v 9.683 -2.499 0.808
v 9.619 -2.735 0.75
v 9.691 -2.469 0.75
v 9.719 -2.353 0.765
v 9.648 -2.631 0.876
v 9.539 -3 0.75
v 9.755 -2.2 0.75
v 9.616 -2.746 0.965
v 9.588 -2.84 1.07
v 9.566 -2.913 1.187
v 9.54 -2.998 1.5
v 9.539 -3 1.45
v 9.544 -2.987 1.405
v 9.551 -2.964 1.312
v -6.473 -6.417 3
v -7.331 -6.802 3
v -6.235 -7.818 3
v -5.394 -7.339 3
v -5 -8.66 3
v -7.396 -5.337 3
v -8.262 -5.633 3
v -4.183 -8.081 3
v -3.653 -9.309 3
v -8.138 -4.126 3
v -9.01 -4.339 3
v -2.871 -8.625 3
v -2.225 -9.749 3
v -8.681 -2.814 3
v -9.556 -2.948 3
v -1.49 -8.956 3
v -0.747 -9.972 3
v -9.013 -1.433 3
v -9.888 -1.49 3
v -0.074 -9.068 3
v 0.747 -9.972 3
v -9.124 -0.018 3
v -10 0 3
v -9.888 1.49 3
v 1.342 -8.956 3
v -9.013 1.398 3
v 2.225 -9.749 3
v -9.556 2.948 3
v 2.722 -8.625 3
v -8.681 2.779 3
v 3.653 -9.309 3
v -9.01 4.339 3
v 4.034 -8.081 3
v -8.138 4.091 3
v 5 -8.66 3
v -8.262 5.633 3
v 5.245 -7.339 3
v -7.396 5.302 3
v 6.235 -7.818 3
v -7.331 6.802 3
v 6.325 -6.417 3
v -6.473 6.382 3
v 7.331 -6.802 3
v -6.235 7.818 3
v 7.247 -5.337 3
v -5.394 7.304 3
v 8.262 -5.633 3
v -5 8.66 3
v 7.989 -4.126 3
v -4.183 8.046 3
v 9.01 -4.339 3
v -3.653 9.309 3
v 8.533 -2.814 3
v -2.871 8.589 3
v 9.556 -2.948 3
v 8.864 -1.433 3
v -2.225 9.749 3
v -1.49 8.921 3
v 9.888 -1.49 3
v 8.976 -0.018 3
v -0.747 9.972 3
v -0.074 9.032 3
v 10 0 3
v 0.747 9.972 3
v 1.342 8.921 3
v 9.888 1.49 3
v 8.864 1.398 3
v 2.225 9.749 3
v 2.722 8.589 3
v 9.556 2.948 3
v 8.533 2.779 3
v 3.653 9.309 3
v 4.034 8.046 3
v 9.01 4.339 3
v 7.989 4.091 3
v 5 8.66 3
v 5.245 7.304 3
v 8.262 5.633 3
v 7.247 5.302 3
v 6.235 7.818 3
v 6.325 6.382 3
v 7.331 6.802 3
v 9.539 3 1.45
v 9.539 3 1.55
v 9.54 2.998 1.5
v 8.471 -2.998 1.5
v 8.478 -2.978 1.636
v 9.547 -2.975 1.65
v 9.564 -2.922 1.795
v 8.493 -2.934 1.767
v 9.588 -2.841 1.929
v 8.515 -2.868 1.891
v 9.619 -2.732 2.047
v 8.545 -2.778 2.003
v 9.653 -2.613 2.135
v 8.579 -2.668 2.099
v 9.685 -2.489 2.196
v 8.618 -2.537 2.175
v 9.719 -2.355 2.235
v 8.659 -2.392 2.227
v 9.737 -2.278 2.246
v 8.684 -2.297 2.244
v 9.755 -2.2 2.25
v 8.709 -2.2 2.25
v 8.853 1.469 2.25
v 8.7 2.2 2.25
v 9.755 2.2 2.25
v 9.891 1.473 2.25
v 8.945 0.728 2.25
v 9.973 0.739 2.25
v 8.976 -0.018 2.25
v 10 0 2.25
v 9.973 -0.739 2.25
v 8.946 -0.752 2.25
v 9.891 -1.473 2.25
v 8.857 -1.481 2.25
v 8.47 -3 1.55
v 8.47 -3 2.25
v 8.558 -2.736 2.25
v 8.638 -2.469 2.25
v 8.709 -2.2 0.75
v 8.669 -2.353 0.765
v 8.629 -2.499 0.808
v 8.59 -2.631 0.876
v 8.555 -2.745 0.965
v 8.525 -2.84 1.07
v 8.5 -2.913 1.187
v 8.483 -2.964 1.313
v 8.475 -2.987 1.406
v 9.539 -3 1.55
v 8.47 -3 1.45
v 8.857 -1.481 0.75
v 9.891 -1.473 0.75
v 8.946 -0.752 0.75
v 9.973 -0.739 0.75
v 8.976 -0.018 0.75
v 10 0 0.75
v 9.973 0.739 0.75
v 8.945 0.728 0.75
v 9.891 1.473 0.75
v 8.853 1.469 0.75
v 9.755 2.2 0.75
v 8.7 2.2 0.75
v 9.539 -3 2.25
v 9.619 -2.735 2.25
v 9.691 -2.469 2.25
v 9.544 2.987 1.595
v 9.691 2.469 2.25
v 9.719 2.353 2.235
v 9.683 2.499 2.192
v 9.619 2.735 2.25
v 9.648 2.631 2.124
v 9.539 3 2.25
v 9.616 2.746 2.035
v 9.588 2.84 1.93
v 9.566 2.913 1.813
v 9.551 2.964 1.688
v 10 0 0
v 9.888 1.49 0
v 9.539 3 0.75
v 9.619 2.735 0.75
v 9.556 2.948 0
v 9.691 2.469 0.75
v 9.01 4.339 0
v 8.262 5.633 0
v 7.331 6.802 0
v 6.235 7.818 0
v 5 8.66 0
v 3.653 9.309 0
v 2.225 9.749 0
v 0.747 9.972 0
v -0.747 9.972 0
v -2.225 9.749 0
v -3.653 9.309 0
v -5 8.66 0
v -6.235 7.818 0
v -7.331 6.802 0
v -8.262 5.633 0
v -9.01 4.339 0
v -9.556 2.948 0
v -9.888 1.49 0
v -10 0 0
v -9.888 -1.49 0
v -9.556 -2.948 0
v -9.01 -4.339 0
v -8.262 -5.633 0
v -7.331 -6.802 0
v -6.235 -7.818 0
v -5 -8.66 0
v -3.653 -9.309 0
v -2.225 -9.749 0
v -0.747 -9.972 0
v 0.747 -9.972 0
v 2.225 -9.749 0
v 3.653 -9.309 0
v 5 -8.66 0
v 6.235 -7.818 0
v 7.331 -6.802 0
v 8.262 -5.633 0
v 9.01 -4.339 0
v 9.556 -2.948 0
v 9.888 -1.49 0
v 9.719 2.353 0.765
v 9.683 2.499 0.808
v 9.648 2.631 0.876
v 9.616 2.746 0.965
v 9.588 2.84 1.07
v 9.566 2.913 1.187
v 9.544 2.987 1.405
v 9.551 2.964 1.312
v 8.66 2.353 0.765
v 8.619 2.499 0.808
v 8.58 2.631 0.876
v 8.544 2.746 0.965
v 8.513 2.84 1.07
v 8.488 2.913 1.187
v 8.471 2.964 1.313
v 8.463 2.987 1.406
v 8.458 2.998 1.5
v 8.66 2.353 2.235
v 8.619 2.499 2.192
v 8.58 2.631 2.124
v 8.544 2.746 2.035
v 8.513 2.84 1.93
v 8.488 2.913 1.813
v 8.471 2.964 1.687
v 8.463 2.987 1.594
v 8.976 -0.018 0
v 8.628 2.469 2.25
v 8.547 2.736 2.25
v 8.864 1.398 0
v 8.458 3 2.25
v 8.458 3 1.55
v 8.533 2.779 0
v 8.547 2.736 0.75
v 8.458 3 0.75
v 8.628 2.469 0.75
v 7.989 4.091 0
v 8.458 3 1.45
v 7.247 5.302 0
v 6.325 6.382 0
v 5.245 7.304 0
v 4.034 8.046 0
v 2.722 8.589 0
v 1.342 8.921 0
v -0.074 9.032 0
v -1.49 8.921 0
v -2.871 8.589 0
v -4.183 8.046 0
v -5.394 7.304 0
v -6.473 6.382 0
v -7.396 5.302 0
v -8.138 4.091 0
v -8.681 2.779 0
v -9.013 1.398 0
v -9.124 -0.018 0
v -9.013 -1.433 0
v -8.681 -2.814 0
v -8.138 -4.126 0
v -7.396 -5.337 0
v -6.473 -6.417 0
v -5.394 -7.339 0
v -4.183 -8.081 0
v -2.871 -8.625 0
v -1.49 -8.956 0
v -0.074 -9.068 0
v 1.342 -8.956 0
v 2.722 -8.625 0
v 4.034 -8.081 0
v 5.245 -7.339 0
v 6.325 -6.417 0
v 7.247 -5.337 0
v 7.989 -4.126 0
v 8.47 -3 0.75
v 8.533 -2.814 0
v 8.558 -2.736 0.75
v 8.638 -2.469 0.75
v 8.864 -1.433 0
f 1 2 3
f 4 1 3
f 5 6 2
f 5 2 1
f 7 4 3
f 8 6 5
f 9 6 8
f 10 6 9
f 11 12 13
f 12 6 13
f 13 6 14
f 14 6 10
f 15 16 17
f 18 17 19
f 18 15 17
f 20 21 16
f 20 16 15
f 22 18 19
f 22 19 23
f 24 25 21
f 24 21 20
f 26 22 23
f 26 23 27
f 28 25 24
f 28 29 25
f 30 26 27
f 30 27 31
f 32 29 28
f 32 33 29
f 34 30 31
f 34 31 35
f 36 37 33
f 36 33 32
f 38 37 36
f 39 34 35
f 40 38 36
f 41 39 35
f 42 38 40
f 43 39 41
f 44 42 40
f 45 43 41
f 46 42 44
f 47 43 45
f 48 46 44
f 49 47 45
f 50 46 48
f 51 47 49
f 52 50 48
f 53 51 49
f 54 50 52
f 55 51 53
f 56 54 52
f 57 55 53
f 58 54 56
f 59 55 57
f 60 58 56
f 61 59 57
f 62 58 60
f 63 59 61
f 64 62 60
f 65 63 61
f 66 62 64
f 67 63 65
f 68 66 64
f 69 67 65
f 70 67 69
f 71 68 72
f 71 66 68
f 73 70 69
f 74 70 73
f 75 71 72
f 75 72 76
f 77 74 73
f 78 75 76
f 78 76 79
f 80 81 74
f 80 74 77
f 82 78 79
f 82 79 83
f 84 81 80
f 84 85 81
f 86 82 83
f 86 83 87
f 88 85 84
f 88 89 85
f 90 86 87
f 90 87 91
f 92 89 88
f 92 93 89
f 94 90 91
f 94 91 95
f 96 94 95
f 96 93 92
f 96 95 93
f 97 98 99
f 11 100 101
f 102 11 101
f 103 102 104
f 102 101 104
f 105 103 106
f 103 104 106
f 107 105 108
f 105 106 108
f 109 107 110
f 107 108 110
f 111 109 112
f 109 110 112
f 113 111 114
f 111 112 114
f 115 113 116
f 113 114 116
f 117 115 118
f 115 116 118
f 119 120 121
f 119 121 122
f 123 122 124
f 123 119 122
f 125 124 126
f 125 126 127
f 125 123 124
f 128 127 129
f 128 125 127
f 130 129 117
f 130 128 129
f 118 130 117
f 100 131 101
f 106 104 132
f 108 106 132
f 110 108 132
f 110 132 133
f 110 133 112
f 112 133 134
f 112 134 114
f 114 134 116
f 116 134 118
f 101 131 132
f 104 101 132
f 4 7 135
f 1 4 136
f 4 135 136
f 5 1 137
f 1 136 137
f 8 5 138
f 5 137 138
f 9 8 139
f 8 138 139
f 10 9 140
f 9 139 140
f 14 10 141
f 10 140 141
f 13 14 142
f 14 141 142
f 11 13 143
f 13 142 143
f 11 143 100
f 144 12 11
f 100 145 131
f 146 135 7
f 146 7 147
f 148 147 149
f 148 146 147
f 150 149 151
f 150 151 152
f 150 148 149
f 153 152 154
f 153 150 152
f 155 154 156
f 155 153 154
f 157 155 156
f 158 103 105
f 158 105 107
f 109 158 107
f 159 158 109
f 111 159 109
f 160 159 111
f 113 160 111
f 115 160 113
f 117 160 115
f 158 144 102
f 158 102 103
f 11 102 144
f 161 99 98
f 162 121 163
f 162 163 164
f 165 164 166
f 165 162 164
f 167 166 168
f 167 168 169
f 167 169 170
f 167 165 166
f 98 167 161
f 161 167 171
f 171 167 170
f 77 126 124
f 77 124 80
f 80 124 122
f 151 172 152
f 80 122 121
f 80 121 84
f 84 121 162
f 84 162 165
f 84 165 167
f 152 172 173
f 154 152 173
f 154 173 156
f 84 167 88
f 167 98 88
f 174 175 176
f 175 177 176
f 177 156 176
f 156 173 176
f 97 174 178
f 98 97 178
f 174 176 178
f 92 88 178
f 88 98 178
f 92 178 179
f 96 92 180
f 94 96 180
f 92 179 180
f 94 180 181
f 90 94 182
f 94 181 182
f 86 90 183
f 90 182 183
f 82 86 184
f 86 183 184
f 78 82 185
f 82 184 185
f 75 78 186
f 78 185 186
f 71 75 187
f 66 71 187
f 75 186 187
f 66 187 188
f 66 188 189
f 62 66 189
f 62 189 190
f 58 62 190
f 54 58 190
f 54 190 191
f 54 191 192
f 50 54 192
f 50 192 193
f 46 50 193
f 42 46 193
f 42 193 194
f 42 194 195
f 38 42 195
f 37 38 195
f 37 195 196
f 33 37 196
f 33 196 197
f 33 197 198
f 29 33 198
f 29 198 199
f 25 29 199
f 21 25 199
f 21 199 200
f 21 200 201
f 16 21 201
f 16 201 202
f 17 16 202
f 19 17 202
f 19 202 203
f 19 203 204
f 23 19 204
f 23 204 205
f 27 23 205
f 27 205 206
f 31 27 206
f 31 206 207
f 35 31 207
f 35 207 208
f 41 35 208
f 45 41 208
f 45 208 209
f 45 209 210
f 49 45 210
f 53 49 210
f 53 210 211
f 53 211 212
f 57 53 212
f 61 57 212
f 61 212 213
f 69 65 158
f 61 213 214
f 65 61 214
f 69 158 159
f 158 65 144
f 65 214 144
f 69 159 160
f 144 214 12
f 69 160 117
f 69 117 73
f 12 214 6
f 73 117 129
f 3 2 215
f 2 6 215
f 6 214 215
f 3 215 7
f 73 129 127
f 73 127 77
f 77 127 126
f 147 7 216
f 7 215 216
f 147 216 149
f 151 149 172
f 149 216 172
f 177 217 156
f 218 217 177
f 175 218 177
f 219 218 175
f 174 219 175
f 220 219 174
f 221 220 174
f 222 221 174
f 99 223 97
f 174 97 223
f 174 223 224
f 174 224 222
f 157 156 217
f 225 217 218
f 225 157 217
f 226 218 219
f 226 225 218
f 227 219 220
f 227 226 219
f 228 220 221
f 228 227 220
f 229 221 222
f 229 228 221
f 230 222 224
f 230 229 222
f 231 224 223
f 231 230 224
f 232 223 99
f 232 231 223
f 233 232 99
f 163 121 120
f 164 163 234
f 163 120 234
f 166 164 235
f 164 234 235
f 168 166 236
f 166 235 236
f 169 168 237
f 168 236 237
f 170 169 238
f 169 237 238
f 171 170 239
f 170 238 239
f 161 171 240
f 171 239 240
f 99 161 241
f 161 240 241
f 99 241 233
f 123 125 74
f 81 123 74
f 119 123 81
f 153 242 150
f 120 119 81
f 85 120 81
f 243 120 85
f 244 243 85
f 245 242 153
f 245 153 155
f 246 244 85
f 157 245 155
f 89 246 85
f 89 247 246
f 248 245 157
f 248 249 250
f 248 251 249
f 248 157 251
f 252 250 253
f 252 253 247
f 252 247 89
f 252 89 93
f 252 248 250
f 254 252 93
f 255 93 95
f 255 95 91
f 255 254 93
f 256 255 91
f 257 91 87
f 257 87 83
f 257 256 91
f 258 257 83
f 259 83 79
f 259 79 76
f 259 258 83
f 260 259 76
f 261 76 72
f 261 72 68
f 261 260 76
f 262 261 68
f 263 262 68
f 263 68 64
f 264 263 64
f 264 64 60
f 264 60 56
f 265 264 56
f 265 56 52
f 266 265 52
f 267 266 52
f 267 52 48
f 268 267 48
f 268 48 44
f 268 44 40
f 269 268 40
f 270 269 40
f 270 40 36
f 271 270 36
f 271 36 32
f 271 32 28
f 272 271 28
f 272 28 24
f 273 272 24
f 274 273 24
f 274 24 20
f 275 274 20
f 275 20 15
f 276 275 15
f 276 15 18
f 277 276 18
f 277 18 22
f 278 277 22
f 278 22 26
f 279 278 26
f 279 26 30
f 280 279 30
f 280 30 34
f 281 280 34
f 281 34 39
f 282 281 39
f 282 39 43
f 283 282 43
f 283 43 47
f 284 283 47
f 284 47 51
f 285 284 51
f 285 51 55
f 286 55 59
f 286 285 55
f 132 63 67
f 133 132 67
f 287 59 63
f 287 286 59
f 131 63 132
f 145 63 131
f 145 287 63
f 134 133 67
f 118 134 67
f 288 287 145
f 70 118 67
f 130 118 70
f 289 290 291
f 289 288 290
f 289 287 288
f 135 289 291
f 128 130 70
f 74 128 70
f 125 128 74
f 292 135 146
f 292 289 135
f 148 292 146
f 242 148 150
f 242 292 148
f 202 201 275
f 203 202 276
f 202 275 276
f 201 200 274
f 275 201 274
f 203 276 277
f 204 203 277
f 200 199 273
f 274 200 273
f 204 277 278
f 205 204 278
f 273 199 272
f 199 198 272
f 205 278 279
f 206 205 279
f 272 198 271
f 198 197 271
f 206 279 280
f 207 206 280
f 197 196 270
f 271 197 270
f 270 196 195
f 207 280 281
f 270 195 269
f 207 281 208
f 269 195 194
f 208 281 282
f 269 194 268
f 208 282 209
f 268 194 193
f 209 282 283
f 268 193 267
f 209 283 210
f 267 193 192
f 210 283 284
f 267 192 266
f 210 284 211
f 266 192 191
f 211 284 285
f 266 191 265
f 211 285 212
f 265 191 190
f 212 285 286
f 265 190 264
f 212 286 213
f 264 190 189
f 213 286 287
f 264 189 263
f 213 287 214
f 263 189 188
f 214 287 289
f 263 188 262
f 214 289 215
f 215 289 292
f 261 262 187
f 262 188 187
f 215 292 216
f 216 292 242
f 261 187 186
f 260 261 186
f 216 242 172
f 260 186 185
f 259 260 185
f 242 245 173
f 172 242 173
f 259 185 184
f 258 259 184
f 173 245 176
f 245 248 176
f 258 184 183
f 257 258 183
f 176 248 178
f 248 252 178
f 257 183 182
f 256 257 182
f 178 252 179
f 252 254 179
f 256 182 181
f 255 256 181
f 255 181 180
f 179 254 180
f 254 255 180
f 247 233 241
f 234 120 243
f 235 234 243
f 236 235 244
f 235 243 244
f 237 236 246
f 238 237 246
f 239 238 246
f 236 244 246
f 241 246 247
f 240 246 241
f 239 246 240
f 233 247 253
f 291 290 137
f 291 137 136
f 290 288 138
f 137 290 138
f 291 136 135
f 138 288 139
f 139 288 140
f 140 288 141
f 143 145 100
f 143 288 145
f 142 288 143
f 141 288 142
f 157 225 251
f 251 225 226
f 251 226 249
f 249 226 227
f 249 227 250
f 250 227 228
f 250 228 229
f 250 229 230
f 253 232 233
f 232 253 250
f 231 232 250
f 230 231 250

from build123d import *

# Parameters (mm, degrees)
F0_R         = 10
F0_R_2       = 9.05
F1_DEPTH     = 3
F3_DEPTH     = 25
F4_T4_DEPTH  = 5.0690329252
F4_S5_R      = 10
F4_T6_DEPTH  = 4
F4_S7_R      = 9.05
F4_T8_DEPTH  = 4
F4_T12_DEPTH = 5.0690329252
F4_S13_R     = 10
F4_T14_DEPTH = 4
F4_S15_R     = 9.05
F4_T16_DEPTH = 4
F4_T20_DEPTH = 5.0814545551
F4_S21_R     = 10
F4_T22_DEPTH = 4
F4_S23_R     = 9.05
F4_T24_DEPTH = 4
F4_T28_DEPTH = 5.0814545551
F4_S29_R     = 10
F4_T30_DEPTH = 4
F4_S31_R     = 9.05
F4_T32_DEPTH = 4


# Not quite as in the source:
# - a fillet or chamfer that OpenCascade refuses, or shapes differently, is made with other operations: its cross-section is extruded or revolved along the edge and cut away or added


with BuildPart() as f1:
    # F0 (on Top) → F1 (new body)
    with BuildSketch(Plane.XY):
        Circle(F0_R)
        with Locations((-0.0741272524, -0.0176765498)):
            Circle(F0_R_2, mode=Mode.SUBTRACT)
    extrude(amount=F1_DEPTH)

    # F2 (on Right) → F3 (cut)
    with BuildSketch(Plane.YZ):
        Polygon((3, 0.75), (3, 2.25), (-3, 2.25), (-3, 0.75), (0, 0.75), align=None)
    extrude(amount=F3_DEPTH, mode=Mode.SUBTRACT)

    # F4: fillet of radius 0.8 on 4 edges, made by hand


with BuildPart() as f4_tool2:
    # F4_s3 → F4_t4 (new body)
    with BuildSketch(Plane.YZ.offset(6.4703590889)):
        with BuildLine():
            ThreePointArc((-3, 1.45), (-2.7656854249, 2.0156854249), (-2.2, 2.25))
            Line((-2.2, 2.25), (-3, 2.25))
            Line((-3, 2.25), (-3, 1.45))
        make_face()
    extrude(amount=F4_T4_DEPTH)

    # F4_s5 → F4_t6 (intersect, symmetric)
    with BuildSketch(Plane.XY.offset(1.9)):
        Circle(F4_S5_R)
    extrude(amount=F4_T6_DEPTH, both=True, mode=Mode.INTERSECT)

    # F4_s7 → F4_t8 (cut, symmetric)
    with BuildSketch(Plane.XY.offset(1.9)):
        with Locations((-0.0741272524, -0.0176765498)):
            Circle(F4_S7_R)
    extrude(amount=F4_T8_DEPTH, both=True, mode=Mode.SUBTRACT)


with BuildPart() as f1_1:
    add(f1.part)

    # F4_t1: union F4_tool2
    add(f4_tool2.part)


with BuildPart() as f4_tool10:
    # F4_s11 → F4_t12 (new body)
    with BuildSketch(Plane.YZ.offset(6.4703590889)):
        with BuildLine():
            ThreePointArc((-2.2, 0.75), (-2.7656854249, 0.9843145751), (-3, 1.55))
            Line((-3, 1.55), (-3, 0.75))
            Line((-3, 0.75), (-2.2, 0.75))
        make_face()
    extrude(amount=F4_T12_DEPTH)

    # F4_s13 → F4_t14 (intersect, symmetric)
    with BuildSketch(Plane.XY.offset(1.1)):
        Circle(F4_S13_R)
    extrude(amount=F4_T14_DEPTH, both=True, mode=Mode.INTERSECT)

    # F4_s15 → F4_t16 (cut, symmetric)
    with BuildSketch(Plane.XY.offset(1.1)):
        with Locations((-0.0741272524, -0.0176765498)):
            Circle(F4_S15_R)
    extrude(amount=F4_T16_DEPTH, both=True, mode=Mode.SUBTRACT)


with BuildPart() as f1_2:
    add(f1_1.part)

    # F4_t9: union F4_tool10
    add(f4_tool10.part)


with BuildPart() as f4_tool18:
    # F4_s19 → F4_t20 (new body)
    with BuildSketch(Plane.YZ.offset(6.457937459)):
        with BuildLine():
            ThreePointArc((2.2, 2.25), (2.7656854249, 2.0156854249), (3, 1.45))
            Line((3, 1.45), (3, 2.25))
            Line((3, 2.25), (2.2, 2.25))
        make_face()
    extrude(amount=F4_T20_DEPTH)

    # F4_s21 → F4_t22 (intersect, symmetric)
    with BuildSketch(Plane.XY.offset(1.9)):
        Circle(F4_S21_R)
    extrude(amount=F4_T22_DEPTH, both=True, mode=Mode.INTERSECT)

    # F4_s23 → F4_t24 (cut, symmetric)
    with BuildSketch(Plane.XY.offset(1.9)):
        with Locations((-0.0741272524, -0.0176765498)):
            Circle(F4_S23_R)
    extrude(amount=F4_T24_DEPTH, both=True, mode=Mode.SUBTRACT)


with BuildPart() as f1_3:
    add(f1_2.part)

    # F4_t17: union F4_tool18
    add(f4_tool18.part)


with BuildPart() as f4_tool26:
    # F4_s27 → F4_t28 (new body)
    with BuildSketch(Plane.YZ.offset(6.457937459)):
        with BuildLine():
            ThreePointArc((2.2, 0.75), (2.7656854249, 0.9843145751), (3, 1.55))
            Line((3, 1.55), (3, 0.75))
            Line((3, 0.75), (2.2, 0.75))
        make_face()
    extrude(amount=F4_T28_DEPTH)

    # F4_s29 → F4_t30 (intersect, symmetric)
    with BuildSketch(Plane.XY.offset(1.1)):
        Circle(F4_S29_R)
    extrude(amount=F4_T30_DEPTH, both=True, mode=Mode.INTERSECT)

    # F4_s31 → F4_t32 (cut, symmetric)
    with BuildSketch(Plane.XY.offset(1.1)):
        with Locations((-0.0741272524, -0.0176765498)):
            Circle(F4_S31_R)
    extrude(amount=F4_T32_DEPTH, both=True, mode=Mode.SUBTRACT)


with BuildPart() as f1_4:
    add(f1_3.part)

    # F4_t25: union F4_tool26
    add(f4_tool26.part)


solid = f1_4.part
